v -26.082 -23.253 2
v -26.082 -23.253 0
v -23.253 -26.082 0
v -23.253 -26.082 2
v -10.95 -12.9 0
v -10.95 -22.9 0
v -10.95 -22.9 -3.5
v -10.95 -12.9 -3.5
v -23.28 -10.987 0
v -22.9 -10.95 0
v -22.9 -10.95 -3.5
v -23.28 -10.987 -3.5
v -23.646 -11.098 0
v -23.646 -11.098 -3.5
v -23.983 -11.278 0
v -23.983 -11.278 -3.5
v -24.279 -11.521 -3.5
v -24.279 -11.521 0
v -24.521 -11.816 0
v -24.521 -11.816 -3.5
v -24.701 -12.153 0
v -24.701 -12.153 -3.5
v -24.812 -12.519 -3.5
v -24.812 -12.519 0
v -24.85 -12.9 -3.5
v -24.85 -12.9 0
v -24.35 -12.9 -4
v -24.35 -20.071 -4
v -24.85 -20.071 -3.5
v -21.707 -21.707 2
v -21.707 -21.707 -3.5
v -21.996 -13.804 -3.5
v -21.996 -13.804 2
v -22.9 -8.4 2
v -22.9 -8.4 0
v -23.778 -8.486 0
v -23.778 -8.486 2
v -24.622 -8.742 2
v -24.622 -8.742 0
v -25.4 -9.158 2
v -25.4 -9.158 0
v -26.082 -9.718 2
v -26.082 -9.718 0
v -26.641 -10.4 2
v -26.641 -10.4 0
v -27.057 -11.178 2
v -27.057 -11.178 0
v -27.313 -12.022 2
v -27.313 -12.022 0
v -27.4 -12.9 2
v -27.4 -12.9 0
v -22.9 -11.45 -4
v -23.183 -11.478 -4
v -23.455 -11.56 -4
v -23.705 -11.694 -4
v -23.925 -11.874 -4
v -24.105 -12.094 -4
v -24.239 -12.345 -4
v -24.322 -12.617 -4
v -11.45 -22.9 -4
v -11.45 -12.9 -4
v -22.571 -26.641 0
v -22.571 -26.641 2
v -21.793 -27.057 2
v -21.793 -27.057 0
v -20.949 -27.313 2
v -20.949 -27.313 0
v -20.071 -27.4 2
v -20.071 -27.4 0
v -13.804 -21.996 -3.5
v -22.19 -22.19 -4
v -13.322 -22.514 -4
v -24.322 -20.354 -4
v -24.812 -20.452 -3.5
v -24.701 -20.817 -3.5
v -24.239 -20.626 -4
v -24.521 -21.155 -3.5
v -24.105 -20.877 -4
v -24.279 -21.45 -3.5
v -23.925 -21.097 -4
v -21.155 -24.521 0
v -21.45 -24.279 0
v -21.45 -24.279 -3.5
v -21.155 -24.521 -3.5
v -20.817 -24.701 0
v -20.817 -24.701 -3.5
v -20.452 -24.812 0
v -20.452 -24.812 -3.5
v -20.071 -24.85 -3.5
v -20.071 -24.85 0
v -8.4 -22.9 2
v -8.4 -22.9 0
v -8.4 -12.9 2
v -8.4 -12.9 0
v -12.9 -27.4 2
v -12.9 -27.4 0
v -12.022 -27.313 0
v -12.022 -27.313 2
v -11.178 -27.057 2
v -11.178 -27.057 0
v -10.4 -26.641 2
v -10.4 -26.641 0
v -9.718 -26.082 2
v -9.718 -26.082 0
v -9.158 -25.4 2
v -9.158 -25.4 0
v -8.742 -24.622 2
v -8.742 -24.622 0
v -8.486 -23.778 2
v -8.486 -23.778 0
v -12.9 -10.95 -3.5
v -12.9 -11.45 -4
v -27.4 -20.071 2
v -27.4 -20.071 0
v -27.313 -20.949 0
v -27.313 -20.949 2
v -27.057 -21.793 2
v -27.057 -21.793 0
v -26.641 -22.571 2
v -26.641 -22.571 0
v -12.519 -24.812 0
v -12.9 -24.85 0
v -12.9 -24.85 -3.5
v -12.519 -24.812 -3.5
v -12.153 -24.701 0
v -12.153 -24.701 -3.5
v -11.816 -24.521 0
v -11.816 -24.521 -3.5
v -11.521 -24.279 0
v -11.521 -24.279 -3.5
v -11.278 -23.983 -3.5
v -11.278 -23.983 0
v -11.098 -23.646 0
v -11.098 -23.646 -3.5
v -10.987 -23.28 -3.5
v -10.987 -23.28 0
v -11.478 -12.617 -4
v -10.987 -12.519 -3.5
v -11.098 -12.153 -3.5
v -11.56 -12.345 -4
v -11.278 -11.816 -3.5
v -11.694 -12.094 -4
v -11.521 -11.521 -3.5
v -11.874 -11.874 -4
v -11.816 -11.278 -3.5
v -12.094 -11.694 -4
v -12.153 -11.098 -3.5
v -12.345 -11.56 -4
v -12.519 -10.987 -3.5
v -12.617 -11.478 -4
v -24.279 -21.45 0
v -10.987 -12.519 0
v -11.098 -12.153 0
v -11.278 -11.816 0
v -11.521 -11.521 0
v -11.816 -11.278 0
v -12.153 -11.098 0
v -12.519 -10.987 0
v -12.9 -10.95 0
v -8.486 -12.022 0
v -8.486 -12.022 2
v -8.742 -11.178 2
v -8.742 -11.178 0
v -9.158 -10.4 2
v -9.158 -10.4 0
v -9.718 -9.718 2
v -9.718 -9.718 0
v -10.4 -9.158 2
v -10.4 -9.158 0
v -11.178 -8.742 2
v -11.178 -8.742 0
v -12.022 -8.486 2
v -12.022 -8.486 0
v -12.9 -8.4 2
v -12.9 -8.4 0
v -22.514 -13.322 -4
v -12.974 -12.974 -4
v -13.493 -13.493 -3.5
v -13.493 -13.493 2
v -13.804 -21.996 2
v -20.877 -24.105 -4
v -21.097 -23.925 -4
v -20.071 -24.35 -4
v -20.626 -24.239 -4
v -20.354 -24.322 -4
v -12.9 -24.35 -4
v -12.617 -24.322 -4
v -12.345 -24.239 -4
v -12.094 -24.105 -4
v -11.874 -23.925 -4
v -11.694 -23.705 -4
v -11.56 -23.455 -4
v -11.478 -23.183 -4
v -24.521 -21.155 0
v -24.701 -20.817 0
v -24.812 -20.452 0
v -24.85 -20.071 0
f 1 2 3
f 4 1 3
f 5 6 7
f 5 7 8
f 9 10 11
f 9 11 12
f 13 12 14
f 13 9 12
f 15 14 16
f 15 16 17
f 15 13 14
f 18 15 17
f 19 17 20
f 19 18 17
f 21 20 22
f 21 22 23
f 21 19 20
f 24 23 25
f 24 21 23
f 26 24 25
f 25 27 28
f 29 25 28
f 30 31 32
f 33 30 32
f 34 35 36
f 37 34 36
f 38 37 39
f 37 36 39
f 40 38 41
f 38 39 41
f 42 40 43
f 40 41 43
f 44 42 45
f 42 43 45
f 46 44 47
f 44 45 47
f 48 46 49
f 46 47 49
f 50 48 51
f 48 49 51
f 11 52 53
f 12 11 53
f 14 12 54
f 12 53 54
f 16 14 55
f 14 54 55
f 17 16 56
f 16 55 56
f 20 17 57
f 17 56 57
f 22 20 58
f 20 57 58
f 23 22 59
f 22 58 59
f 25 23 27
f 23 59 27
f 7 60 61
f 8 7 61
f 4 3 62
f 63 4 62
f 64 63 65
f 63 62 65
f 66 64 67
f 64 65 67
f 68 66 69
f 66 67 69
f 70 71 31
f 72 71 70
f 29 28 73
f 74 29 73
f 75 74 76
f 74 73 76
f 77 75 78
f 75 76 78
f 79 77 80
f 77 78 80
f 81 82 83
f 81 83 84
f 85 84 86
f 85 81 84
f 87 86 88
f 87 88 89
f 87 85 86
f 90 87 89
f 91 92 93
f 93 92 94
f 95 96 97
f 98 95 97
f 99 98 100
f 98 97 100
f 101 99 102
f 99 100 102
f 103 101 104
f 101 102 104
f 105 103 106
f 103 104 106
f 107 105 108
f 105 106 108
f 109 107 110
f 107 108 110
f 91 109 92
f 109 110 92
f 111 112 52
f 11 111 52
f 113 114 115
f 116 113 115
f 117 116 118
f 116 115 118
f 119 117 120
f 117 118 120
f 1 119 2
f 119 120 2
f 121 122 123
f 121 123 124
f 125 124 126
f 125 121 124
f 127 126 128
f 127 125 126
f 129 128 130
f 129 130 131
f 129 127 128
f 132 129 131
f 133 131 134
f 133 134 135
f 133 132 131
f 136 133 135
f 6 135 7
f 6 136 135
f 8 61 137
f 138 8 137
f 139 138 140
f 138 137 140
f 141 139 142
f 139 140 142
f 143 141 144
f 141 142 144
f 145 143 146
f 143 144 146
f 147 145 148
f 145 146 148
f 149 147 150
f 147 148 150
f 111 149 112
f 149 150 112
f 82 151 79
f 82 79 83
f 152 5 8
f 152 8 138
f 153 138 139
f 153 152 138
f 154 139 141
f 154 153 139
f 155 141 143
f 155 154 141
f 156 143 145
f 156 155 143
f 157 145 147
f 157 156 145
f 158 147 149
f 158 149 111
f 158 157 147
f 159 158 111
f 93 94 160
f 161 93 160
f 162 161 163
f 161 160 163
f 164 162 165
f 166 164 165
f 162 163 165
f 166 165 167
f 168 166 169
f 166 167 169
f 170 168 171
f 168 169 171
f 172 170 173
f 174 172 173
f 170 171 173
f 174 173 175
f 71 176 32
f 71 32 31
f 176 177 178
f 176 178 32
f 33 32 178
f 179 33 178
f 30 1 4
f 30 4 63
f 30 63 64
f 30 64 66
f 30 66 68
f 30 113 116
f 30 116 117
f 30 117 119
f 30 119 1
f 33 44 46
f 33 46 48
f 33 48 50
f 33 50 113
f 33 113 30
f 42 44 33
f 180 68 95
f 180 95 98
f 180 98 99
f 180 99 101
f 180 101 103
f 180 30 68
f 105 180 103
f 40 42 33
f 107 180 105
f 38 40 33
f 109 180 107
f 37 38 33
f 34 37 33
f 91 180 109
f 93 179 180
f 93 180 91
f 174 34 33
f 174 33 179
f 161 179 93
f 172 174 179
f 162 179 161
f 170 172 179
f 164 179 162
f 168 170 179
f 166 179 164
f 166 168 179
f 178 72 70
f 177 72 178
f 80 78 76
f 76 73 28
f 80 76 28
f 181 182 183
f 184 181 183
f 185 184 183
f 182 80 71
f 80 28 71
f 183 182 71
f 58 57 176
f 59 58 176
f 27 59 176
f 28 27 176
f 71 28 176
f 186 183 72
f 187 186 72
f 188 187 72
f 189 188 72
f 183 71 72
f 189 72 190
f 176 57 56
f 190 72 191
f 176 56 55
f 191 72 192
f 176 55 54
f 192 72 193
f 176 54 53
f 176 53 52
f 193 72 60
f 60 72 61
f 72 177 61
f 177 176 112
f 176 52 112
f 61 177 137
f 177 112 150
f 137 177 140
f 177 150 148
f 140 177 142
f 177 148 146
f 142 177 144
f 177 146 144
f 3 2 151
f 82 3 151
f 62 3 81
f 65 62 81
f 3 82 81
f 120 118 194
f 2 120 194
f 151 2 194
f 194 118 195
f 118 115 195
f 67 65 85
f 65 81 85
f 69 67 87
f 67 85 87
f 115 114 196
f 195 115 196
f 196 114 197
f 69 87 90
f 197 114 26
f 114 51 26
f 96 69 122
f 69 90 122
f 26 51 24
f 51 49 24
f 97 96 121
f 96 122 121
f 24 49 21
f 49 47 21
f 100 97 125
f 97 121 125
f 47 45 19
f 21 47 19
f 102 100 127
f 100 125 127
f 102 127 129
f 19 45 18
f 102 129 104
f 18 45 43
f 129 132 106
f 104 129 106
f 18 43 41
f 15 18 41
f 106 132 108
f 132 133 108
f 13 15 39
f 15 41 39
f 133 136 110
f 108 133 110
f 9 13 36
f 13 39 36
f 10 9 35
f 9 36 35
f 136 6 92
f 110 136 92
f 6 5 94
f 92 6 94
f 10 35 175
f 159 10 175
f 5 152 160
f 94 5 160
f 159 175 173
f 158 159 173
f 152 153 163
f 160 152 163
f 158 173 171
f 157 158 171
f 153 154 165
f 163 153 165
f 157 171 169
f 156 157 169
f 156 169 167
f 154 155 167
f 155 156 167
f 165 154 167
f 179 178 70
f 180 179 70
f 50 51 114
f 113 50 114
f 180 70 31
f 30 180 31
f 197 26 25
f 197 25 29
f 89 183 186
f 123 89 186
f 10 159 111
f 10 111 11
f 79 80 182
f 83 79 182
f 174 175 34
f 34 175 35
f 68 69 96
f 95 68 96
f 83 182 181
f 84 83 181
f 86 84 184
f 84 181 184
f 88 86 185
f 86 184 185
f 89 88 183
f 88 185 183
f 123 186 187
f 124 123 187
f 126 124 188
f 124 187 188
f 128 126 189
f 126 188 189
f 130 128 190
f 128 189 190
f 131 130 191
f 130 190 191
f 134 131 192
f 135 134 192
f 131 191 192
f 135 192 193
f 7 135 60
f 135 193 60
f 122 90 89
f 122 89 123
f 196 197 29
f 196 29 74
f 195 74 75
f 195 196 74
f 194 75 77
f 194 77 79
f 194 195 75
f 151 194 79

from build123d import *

# Parameters (mm, degrees)
BOSS_EXTRUDE1_DEPTH     = 2
BOSS_EXTRUDE2_DEPTH     = 4
CUT_EXTRUDE1_DEPTH      = 39.9548816
CUT_EXTRUDE1_DEPTH_BACK = 39.9548816
CHAMFER1_SIZE           = 0.5


with BuildPart() as part:
    # Sketch2 → Boss-Extrude1 (new body)
    with BuildSketch(Plane.XY):
        with BuildLine():
            Line((-26.081641102, -23.253213977), (-23.253213977, -26.081641102))
            ThreePointArc((-23.253213977, -26.081641102), (-21.793308907, -27.057118483), (-20.071233462, -27.399660586))
            Line((-20.071233462, -27.399660586), (-12.899660586, -27.399660586))
            ThreePointArc((-12.899660586, -27.399660586), (-9.717680071, -26.081641102), (-8.399660586, -22.899660586))
            Line((-8.399660586, -22.899660586), (-8.399660586, -12.899660586))
            ThreePointArc((-8.399660586, -12.899660586), (-9.717680071, -9.717680071), (-12.899660586, -8.399660586))
            Line((-12.899660586, -8.399660586), (-22.899660586, -8.399660586))
            ThreePointArc((-22.899660586, -8.399660586), (-26.081641102, -9.717680071), (-27.399660586, -12.899660586))
            Line((-27.399660586, -12.899660586), (-27.399660586, -20.071233462))
            ThreePointArc((-27.399660586, -20.071233462), (-27.057118483, -21.793308907), (-26.081641102, -23.253213977))
        make_face()
    extrude(amount=BOSS_EXTRUDE1_DEPTH)

    # Sketch1 → Boss-Extrude2 (add)
    with BuildSketch(Plane.XY):
        with BuildLine():
            Line((-12.899660586, -10.949660586), (-22.899660586, -10.949660586))
            ThreePointArc((-22.899660586, -10.949660586), (-24.27851881, -11.520802363), (-24.849660586, -12.899660586))
            Line((-24.849660586, -12.899660586), (-24.849660586, -20.071233462))
            ThreePointArc((-24.849660586, -20.071233462), (-24.701225675, -20.817466155), (-24.27851881, -21.450091685))
            Line((-24.27851881, -21.450091685), (-21.450091685, -24.27851881))
            ThreePointArc((-21.450091685, -24.27851881), (-20.817466155, -24.701225675), (-20.071233462, -24.849660586))
            Line((-20.071233462, -24.849660586), (-12.899660586, -24.849660586))
            ThreePointArc((-12.899660586, -24.849660586), (-11.520802363, -24.27851881), (-10.949660586, -22.899660586))
            Line((-10.949660586, -22.899660586), (-10.949660586, -12.899660586))
            ThreePointArc((-10.949660586, -12.899660586), (-11.520802363, -11.520802363), (-12.899660586, -10.949660586))
        make_face()
    extrude(amount=-BOSS_EXTRUDE2_DEPTH)

    # Sketch3 → Cut-Extrude1 (cut, two sides: drawn at the far end of the back side and taken through both)
    with BuildSketch(Plane.XY.offset(-CUT_EXTRUDE1_DEPTH_BACK)):
        Polygon((-21.995634526, -13.803686646), (-13.493013972, -13.493013972), (-13.803686646, -21.995634526), (-21.706864564, -21.706864564), align=None)
    extrude(amount=CUT_EXTRUDE1_DEPTH + CUT_EXTRUDE1_DEPTH_BACK, mode=Mode.SUBTRACT)

    # Chamfer1
    chamfer1_edges = [part.edges().sort_by_distance(p)[0] for p in [
        (-11.520802363, -11.520802363, -4),
        (-10.949660586, -17.899660586, -4),
        (-11.520802363, -24.27851881, -4),
        (-16.485447024, -24.849660586, -4),
        (-20.817466155, -24.701225675, -4),
        (-22.864305247, -22.864305247, -4),
        (-24.701225675, -20.817466155, -4),
        (-24.849660586, -16.485447024, -4),
        (-24.27851881, -11.520802363, -4),
        (-17.899660586, -10.949660586, -4),
        (-21.851249545, -17.755275605, -4),
        (-17.755275605, -21.851249545, -4),
        (-13.648350309, -17.744324249, -4),
        (-17.744324249, -13.648350309, -4),
    ]]
    chamfer(chamfer1_edges, length=CHAMFER1_SIZE)


solid = part.part
